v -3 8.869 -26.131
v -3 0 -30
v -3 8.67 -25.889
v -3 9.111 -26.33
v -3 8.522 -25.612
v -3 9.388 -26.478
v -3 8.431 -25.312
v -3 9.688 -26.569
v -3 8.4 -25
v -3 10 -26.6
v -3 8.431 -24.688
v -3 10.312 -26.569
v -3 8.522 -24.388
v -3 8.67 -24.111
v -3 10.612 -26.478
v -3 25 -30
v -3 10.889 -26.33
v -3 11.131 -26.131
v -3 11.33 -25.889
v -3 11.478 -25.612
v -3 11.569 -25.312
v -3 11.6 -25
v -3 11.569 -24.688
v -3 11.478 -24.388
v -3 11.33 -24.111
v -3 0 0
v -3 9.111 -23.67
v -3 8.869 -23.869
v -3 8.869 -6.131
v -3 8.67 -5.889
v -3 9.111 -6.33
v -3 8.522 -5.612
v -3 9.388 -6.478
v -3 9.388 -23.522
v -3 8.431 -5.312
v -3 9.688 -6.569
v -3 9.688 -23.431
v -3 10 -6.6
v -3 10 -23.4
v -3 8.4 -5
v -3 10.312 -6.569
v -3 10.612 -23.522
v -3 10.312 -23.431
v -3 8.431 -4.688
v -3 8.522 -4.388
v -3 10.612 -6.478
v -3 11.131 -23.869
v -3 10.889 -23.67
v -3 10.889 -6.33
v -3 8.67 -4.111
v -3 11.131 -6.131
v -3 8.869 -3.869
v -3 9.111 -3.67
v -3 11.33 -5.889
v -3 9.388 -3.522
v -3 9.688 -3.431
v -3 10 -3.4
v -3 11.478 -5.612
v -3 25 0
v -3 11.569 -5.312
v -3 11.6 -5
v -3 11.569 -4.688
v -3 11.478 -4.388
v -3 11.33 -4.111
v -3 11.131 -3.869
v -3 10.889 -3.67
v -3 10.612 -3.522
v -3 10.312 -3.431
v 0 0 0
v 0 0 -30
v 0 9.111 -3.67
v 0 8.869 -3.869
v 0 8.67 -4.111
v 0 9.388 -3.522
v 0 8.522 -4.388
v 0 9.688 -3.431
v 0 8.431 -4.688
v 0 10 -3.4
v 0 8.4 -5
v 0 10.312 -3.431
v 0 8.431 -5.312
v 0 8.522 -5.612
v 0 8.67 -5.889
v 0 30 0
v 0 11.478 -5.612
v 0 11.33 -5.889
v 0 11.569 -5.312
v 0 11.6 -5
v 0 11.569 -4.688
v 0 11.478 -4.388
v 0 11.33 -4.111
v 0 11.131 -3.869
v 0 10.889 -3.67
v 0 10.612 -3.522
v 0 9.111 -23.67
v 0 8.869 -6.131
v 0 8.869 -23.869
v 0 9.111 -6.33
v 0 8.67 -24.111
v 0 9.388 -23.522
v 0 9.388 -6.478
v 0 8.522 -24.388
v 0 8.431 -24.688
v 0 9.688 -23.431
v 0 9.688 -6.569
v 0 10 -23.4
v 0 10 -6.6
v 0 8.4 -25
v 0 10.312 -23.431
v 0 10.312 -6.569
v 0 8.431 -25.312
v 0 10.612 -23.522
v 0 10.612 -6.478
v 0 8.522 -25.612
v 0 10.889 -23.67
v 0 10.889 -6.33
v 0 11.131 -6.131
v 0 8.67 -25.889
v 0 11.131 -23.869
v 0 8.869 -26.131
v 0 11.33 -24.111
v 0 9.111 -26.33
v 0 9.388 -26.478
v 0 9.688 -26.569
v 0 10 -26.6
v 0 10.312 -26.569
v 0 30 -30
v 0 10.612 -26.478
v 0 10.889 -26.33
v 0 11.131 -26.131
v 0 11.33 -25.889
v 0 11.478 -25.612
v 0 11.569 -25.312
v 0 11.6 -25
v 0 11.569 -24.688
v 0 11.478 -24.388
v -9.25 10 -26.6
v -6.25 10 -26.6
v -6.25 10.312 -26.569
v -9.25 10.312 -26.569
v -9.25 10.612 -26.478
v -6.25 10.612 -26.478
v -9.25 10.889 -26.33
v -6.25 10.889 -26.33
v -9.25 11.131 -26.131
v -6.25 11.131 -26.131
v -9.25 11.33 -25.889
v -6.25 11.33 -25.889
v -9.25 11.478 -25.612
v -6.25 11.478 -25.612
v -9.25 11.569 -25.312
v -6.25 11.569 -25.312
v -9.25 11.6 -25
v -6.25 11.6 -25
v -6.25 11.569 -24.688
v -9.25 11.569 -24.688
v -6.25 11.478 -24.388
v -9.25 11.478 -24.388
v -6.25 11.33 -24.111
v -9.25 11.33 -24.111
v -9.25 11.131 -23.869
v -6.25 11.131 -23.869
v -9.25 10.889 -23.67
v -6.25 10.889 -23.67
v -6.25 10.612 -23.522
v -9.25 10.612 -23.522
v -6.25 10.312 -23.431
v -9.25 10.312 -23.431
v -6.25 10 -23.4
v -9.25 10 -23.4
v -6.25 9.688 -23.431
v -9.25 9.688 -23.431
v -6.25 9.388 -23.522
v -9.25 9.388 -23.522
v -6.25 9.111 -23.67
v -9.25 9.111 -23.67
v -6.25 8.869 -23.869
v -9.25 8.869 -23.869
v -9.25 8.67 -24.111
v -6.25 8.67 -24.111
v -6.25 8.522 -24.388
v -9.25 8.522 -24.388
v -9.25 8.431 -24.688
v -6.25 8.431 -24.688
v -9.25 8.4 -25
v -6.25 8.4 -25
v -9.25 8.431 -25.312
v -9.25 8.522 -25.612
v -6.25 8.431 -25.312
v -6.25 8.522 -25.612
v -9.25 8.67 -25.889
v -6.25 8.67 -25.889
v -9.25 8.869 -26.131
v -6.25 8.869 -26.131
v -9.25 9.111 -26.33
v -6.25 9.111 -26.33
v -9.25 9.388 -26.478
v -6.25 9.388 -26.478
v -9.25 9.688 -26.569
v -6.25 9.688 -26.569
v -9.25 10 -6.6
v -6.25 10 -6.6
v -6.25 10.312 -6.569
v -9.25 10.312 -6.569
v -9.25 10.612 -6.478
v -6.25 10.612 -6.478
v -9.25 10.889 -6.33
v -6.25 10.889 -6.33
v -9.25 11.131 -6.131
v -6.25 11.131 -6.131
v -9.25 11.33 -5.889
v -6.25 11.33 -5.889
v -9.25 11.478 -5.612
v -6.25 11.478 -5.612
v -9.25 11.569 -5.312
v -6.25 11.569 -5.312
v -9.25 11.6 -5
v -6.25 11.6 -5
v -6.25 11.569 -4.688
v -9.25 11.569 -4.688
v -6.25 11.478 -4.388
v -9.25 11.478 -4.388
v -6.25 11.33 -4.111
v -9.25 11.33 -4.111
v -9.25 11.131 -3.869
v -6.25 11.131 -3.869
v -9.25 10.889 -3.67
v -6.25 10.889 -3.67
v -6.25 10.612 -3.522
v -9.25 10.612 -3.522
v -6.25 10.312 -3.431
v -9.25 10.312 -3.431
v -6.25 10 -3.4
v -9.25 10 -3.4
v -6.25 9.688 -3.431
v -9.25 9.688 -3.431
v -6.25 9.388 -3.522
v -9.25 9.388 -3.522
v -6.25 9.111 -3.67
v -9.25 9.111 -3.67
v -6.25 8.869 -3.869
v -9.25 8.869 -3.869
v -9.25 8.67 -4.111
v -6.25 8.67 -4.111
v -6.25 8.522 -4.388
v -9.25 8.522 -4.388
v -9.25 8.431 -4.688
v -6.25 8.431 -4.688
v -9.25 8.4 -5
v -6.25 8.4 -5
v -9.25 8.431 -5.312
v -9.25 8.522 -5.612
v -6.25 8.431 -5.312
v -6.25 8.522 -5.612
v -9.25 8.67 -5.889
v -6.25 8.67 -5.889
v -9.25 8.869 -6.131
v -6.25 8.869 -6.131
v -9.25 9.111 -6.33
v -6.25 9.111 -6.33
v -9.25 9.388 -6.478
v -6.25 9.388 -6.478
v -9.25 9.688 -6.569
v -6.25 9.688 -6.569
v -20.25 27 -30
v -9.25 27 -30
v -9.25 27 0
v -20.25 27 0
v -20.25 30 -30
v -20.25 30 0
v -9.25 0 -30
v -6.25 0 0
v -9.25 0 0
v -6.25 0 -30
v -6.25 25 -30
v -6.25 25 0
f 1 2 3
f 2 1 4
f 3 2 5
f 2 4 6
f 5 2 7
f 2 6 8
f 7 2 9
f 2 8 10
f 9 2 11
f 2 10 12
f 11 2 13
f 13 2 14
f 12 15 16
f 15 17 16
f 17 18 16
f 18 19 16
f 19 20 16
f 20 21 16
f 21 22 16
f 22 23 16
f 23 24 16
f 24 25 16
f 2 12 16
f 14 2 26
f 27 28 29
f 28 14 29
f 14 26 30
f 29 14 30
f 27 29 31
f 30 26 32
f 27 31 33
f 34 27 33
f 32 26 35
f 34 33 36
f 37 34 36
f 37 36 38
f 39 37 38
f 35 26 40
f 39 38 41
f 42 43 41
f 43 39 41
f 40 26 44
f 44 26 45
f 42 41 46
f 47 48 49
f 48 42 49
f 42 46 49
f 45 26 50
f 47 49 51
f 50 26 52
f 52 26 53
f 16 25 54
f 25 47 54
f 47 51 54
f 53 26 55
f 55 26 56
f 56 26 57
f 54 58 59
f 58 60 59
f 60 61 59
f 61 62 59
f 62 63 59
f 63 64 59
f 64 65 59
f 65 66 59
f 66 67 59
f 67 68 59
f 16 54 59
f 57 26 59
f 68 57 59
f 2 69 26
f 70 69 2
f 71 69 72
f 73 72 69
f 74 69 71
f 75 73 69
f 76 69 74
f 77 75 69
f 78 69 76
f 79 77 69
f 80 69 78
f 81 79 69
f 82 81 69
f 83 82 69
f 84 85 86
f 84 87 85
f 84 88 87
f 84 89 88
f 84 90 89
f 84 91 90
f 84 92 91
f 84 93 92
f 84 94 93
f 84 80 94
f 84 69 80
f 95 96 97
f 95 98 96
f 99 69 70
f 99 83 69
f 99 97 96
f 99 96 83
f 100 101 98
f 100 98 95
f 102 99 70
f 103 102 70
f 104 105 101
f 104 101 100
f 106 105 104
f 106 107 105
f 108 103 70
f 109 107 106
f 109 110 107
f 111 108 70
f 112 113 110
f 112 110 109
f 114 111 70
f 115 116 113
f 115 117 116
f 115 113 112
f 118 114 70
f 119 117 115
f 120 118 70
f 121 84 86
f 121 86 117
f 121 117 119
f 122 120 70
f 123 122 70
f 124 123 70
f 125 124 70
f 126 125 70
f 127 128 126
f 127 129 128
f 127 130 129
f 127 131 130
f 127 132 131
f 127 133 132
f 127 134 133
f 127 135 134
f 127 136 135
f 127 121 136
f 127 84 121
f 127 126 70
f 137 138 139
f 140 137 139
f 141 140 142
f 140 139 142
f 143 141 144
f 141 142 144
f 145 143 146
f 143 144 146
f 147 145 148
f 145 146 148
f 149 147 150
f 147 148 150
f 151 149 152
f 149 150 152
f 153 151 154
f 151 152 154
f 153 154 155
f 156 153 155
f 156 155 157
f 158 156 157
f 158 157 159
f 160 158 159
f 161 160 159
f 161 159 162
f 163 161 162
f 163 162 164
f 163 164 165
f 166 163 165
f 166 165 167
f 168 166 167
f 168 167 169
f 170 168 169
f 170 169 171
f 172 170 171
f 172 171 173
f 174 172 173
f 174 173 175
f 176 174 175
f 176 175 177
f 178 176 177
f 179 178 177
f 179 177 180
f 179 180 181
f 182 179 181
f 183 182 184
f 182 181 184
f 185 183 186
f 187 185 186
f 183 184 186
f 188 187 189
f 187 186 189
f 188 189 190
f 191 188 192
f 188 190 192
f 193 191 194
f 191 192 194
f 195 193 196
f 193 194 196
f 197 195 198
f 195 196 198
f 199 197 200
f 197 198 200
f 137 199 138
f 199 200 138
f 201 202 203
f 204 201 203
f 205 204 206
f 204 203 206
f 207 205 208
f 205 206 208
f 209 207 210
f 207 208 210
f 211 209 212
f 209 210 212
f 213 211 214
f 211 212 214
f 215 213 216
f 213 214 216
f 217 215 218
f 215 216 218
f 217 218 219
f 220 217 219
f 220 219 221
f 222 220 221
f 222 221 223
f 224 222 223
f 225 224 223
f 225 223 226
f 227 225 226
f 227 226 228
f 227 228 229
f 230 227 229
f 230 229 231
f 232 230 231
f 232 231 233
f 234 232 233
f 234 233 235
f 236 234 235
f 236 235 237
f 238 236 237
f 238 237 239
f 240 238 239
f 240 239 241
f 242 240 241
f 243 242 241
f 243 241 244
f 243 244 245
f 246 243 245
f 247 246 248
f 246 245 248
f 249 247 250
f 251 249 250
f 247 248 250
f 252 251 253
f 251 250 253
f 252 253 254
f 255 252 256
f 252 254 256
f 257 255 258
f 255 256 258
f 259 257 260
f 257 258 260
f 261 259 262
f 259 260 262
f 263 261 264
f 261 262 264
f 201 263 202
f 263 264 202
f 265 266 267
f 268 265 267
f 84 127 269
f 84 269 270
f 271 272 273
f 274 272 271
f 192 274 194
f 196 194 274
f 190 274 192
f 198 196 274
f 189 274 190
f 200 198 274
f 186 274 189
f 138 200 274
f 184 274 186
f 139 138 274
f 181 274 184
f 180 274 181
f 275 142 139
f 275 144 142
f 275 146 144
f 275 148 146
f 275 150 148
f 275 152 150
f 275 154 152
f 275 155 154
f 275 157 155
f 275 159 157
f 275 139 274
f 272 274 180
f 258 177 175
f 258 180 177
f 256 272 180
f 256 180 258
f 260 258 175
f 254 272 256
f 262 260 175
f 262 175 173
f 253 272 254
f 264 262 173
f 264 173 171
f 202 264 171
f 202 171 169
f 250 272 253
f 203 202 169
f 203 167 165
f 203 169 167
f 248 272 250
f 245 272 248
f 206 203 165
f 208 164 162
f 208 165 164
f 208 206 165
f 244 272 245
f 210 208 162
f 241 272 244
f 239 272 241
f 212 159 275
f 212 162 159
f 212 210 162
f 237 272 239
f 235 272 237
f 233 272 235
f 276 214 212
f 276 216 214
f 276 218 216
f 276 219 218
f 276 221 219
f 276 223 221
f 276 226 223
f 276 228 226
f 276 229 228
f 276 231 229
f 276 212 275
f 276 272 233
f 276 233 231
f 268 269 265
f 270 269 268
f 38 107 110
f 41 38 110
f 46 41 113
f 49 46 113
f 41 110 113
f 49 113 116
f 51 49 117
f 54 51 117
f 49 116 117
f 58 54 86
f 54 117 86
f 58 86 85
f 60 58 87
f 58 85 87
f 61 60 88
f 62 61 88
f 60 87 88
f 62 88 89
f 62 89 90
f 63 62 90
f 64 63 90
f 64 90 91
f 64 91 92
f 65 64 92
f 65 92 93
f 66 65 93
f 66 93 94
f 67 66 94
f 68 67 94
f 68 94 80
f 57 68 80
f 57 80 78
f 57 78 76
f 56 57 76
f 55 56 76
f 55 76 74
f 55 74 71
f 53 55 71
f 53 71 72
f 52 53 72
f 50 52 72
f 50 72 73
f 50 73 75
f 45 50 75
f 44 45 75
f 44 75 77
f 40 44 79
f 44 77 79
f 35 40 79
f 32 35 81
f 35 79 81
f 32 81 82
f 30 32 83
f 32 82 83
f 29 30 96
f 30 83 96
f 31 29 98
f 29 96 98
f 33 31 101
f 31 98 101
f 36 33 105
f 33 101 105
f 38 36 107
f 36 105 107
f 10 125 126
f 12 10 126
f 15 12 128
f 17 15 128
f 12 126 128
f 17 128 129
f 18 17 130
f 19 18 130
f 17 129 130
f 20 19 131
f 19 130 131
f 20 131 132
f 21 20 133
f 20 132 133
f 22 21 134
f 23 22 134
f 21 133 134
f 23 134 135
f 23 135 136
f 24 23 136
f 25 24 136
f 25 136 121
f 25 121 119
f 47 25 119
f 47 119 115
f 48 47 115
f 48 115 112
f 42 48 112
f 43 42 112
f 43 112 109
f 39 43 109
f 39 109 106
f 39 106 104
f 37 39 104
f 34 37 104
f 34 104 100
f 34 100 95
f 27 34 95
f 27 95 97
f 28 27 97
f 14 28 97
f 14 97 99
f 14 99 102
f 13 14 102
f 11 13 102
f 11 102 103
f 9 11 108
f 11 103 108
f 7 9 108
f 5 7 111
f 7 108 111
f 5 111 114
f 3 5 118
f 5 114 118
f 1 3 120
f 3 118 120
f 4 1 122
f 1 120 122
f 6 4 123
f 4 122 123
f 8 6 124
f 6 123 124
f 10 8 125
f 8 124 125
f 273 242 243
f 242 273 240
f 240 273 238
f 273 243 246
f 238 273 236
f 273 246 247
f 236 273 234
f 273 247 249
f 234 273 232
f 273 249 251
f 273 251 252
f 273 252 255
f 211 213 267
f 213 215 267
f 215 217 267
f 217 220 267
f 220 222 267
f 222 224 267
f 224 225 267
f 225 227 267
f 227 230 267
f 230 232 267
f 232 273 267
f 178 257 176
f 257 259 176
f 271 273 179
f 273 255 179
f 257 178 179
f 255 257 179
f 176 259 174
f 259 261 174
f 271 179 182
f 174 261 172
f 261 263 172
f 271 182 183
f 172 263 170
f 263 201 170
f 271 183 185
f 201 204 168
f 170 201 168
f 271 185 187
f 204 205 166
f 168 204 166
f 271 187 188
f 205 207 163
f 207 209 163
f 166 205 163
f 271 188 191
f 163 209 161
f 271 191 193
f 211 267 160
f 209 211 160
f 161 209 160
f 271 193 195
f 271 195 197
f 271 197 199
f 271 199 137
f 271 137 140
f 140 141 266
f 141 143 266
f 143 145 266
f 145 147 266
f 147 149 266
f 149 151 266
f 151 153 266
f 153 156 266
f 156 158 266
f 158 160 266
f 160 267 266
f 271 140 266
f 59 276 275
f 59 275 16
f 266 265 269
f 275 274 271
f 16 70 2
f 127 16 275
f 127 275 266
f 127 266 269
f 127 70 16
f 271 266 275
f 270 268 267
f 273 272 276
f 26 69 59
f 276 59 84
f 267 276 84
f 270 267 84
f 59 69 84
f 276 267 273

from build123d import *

# Parameters (mm, degrees)
SKETCH2_W           = 30
SKETCH2_H           = 30
SKETCH2_R           = 1.6
BOSS_EXTRUDE1_DEPTH = 9.25
SKETCH3_W           = 3.25
SKETCH3_H           = 25
CUT_EXTRUDE1_DEPTH  = 44.423064148
SKETCH5_W           = 30
SKETCH5_H           = 3
BOSS_EXTRUDE2_DEPTH = 11


with BuildPart() as part:
    # Sketch2 → Boss-Extrude1 (new body)
    with BuildSketch(Plane(origin=(0, 0, 0), x_dir=(0, 0, -1), z_dir=(1, 0, 0))):
        with Locations((15, 15)):
            Rectangle(SKETCH2_W, SKETCH2_H)
        with Locations((5, 10)):
            Circle(SKETCH2_R, mode=Mode.SUBTRACT)
        with Locations((25, 10)):
            Circle(SKETCH2_R, mode=Mode.SUBTRACT)
    extrude(amount=-BOSS_EXTRUDE1_DEPTH)

    # Sketch3 → Cut-Extrude1 (cut, through all)
    with BuildSketch(Plane.XY):
        with Locations((-4.625, 12.5)):
            Rectangle(SKETCH3_W, SKETCH3_H)
    extrude(amount=-CUT_EXTRUDE1_DEPTH, mode=Mode.SUBTRACT)

    # Sketch5 → Boss-Extrude2 (add)
    with BuildSketch(Plane.ZY.offset(9.25)):
        with Locations((-15, 28.5)):
            Rectangle(SKETCH5_W, SKETCH5_H)
    extrude(amount=BOSS_EXTRUDE2_DEPTH)


solid = part.part
